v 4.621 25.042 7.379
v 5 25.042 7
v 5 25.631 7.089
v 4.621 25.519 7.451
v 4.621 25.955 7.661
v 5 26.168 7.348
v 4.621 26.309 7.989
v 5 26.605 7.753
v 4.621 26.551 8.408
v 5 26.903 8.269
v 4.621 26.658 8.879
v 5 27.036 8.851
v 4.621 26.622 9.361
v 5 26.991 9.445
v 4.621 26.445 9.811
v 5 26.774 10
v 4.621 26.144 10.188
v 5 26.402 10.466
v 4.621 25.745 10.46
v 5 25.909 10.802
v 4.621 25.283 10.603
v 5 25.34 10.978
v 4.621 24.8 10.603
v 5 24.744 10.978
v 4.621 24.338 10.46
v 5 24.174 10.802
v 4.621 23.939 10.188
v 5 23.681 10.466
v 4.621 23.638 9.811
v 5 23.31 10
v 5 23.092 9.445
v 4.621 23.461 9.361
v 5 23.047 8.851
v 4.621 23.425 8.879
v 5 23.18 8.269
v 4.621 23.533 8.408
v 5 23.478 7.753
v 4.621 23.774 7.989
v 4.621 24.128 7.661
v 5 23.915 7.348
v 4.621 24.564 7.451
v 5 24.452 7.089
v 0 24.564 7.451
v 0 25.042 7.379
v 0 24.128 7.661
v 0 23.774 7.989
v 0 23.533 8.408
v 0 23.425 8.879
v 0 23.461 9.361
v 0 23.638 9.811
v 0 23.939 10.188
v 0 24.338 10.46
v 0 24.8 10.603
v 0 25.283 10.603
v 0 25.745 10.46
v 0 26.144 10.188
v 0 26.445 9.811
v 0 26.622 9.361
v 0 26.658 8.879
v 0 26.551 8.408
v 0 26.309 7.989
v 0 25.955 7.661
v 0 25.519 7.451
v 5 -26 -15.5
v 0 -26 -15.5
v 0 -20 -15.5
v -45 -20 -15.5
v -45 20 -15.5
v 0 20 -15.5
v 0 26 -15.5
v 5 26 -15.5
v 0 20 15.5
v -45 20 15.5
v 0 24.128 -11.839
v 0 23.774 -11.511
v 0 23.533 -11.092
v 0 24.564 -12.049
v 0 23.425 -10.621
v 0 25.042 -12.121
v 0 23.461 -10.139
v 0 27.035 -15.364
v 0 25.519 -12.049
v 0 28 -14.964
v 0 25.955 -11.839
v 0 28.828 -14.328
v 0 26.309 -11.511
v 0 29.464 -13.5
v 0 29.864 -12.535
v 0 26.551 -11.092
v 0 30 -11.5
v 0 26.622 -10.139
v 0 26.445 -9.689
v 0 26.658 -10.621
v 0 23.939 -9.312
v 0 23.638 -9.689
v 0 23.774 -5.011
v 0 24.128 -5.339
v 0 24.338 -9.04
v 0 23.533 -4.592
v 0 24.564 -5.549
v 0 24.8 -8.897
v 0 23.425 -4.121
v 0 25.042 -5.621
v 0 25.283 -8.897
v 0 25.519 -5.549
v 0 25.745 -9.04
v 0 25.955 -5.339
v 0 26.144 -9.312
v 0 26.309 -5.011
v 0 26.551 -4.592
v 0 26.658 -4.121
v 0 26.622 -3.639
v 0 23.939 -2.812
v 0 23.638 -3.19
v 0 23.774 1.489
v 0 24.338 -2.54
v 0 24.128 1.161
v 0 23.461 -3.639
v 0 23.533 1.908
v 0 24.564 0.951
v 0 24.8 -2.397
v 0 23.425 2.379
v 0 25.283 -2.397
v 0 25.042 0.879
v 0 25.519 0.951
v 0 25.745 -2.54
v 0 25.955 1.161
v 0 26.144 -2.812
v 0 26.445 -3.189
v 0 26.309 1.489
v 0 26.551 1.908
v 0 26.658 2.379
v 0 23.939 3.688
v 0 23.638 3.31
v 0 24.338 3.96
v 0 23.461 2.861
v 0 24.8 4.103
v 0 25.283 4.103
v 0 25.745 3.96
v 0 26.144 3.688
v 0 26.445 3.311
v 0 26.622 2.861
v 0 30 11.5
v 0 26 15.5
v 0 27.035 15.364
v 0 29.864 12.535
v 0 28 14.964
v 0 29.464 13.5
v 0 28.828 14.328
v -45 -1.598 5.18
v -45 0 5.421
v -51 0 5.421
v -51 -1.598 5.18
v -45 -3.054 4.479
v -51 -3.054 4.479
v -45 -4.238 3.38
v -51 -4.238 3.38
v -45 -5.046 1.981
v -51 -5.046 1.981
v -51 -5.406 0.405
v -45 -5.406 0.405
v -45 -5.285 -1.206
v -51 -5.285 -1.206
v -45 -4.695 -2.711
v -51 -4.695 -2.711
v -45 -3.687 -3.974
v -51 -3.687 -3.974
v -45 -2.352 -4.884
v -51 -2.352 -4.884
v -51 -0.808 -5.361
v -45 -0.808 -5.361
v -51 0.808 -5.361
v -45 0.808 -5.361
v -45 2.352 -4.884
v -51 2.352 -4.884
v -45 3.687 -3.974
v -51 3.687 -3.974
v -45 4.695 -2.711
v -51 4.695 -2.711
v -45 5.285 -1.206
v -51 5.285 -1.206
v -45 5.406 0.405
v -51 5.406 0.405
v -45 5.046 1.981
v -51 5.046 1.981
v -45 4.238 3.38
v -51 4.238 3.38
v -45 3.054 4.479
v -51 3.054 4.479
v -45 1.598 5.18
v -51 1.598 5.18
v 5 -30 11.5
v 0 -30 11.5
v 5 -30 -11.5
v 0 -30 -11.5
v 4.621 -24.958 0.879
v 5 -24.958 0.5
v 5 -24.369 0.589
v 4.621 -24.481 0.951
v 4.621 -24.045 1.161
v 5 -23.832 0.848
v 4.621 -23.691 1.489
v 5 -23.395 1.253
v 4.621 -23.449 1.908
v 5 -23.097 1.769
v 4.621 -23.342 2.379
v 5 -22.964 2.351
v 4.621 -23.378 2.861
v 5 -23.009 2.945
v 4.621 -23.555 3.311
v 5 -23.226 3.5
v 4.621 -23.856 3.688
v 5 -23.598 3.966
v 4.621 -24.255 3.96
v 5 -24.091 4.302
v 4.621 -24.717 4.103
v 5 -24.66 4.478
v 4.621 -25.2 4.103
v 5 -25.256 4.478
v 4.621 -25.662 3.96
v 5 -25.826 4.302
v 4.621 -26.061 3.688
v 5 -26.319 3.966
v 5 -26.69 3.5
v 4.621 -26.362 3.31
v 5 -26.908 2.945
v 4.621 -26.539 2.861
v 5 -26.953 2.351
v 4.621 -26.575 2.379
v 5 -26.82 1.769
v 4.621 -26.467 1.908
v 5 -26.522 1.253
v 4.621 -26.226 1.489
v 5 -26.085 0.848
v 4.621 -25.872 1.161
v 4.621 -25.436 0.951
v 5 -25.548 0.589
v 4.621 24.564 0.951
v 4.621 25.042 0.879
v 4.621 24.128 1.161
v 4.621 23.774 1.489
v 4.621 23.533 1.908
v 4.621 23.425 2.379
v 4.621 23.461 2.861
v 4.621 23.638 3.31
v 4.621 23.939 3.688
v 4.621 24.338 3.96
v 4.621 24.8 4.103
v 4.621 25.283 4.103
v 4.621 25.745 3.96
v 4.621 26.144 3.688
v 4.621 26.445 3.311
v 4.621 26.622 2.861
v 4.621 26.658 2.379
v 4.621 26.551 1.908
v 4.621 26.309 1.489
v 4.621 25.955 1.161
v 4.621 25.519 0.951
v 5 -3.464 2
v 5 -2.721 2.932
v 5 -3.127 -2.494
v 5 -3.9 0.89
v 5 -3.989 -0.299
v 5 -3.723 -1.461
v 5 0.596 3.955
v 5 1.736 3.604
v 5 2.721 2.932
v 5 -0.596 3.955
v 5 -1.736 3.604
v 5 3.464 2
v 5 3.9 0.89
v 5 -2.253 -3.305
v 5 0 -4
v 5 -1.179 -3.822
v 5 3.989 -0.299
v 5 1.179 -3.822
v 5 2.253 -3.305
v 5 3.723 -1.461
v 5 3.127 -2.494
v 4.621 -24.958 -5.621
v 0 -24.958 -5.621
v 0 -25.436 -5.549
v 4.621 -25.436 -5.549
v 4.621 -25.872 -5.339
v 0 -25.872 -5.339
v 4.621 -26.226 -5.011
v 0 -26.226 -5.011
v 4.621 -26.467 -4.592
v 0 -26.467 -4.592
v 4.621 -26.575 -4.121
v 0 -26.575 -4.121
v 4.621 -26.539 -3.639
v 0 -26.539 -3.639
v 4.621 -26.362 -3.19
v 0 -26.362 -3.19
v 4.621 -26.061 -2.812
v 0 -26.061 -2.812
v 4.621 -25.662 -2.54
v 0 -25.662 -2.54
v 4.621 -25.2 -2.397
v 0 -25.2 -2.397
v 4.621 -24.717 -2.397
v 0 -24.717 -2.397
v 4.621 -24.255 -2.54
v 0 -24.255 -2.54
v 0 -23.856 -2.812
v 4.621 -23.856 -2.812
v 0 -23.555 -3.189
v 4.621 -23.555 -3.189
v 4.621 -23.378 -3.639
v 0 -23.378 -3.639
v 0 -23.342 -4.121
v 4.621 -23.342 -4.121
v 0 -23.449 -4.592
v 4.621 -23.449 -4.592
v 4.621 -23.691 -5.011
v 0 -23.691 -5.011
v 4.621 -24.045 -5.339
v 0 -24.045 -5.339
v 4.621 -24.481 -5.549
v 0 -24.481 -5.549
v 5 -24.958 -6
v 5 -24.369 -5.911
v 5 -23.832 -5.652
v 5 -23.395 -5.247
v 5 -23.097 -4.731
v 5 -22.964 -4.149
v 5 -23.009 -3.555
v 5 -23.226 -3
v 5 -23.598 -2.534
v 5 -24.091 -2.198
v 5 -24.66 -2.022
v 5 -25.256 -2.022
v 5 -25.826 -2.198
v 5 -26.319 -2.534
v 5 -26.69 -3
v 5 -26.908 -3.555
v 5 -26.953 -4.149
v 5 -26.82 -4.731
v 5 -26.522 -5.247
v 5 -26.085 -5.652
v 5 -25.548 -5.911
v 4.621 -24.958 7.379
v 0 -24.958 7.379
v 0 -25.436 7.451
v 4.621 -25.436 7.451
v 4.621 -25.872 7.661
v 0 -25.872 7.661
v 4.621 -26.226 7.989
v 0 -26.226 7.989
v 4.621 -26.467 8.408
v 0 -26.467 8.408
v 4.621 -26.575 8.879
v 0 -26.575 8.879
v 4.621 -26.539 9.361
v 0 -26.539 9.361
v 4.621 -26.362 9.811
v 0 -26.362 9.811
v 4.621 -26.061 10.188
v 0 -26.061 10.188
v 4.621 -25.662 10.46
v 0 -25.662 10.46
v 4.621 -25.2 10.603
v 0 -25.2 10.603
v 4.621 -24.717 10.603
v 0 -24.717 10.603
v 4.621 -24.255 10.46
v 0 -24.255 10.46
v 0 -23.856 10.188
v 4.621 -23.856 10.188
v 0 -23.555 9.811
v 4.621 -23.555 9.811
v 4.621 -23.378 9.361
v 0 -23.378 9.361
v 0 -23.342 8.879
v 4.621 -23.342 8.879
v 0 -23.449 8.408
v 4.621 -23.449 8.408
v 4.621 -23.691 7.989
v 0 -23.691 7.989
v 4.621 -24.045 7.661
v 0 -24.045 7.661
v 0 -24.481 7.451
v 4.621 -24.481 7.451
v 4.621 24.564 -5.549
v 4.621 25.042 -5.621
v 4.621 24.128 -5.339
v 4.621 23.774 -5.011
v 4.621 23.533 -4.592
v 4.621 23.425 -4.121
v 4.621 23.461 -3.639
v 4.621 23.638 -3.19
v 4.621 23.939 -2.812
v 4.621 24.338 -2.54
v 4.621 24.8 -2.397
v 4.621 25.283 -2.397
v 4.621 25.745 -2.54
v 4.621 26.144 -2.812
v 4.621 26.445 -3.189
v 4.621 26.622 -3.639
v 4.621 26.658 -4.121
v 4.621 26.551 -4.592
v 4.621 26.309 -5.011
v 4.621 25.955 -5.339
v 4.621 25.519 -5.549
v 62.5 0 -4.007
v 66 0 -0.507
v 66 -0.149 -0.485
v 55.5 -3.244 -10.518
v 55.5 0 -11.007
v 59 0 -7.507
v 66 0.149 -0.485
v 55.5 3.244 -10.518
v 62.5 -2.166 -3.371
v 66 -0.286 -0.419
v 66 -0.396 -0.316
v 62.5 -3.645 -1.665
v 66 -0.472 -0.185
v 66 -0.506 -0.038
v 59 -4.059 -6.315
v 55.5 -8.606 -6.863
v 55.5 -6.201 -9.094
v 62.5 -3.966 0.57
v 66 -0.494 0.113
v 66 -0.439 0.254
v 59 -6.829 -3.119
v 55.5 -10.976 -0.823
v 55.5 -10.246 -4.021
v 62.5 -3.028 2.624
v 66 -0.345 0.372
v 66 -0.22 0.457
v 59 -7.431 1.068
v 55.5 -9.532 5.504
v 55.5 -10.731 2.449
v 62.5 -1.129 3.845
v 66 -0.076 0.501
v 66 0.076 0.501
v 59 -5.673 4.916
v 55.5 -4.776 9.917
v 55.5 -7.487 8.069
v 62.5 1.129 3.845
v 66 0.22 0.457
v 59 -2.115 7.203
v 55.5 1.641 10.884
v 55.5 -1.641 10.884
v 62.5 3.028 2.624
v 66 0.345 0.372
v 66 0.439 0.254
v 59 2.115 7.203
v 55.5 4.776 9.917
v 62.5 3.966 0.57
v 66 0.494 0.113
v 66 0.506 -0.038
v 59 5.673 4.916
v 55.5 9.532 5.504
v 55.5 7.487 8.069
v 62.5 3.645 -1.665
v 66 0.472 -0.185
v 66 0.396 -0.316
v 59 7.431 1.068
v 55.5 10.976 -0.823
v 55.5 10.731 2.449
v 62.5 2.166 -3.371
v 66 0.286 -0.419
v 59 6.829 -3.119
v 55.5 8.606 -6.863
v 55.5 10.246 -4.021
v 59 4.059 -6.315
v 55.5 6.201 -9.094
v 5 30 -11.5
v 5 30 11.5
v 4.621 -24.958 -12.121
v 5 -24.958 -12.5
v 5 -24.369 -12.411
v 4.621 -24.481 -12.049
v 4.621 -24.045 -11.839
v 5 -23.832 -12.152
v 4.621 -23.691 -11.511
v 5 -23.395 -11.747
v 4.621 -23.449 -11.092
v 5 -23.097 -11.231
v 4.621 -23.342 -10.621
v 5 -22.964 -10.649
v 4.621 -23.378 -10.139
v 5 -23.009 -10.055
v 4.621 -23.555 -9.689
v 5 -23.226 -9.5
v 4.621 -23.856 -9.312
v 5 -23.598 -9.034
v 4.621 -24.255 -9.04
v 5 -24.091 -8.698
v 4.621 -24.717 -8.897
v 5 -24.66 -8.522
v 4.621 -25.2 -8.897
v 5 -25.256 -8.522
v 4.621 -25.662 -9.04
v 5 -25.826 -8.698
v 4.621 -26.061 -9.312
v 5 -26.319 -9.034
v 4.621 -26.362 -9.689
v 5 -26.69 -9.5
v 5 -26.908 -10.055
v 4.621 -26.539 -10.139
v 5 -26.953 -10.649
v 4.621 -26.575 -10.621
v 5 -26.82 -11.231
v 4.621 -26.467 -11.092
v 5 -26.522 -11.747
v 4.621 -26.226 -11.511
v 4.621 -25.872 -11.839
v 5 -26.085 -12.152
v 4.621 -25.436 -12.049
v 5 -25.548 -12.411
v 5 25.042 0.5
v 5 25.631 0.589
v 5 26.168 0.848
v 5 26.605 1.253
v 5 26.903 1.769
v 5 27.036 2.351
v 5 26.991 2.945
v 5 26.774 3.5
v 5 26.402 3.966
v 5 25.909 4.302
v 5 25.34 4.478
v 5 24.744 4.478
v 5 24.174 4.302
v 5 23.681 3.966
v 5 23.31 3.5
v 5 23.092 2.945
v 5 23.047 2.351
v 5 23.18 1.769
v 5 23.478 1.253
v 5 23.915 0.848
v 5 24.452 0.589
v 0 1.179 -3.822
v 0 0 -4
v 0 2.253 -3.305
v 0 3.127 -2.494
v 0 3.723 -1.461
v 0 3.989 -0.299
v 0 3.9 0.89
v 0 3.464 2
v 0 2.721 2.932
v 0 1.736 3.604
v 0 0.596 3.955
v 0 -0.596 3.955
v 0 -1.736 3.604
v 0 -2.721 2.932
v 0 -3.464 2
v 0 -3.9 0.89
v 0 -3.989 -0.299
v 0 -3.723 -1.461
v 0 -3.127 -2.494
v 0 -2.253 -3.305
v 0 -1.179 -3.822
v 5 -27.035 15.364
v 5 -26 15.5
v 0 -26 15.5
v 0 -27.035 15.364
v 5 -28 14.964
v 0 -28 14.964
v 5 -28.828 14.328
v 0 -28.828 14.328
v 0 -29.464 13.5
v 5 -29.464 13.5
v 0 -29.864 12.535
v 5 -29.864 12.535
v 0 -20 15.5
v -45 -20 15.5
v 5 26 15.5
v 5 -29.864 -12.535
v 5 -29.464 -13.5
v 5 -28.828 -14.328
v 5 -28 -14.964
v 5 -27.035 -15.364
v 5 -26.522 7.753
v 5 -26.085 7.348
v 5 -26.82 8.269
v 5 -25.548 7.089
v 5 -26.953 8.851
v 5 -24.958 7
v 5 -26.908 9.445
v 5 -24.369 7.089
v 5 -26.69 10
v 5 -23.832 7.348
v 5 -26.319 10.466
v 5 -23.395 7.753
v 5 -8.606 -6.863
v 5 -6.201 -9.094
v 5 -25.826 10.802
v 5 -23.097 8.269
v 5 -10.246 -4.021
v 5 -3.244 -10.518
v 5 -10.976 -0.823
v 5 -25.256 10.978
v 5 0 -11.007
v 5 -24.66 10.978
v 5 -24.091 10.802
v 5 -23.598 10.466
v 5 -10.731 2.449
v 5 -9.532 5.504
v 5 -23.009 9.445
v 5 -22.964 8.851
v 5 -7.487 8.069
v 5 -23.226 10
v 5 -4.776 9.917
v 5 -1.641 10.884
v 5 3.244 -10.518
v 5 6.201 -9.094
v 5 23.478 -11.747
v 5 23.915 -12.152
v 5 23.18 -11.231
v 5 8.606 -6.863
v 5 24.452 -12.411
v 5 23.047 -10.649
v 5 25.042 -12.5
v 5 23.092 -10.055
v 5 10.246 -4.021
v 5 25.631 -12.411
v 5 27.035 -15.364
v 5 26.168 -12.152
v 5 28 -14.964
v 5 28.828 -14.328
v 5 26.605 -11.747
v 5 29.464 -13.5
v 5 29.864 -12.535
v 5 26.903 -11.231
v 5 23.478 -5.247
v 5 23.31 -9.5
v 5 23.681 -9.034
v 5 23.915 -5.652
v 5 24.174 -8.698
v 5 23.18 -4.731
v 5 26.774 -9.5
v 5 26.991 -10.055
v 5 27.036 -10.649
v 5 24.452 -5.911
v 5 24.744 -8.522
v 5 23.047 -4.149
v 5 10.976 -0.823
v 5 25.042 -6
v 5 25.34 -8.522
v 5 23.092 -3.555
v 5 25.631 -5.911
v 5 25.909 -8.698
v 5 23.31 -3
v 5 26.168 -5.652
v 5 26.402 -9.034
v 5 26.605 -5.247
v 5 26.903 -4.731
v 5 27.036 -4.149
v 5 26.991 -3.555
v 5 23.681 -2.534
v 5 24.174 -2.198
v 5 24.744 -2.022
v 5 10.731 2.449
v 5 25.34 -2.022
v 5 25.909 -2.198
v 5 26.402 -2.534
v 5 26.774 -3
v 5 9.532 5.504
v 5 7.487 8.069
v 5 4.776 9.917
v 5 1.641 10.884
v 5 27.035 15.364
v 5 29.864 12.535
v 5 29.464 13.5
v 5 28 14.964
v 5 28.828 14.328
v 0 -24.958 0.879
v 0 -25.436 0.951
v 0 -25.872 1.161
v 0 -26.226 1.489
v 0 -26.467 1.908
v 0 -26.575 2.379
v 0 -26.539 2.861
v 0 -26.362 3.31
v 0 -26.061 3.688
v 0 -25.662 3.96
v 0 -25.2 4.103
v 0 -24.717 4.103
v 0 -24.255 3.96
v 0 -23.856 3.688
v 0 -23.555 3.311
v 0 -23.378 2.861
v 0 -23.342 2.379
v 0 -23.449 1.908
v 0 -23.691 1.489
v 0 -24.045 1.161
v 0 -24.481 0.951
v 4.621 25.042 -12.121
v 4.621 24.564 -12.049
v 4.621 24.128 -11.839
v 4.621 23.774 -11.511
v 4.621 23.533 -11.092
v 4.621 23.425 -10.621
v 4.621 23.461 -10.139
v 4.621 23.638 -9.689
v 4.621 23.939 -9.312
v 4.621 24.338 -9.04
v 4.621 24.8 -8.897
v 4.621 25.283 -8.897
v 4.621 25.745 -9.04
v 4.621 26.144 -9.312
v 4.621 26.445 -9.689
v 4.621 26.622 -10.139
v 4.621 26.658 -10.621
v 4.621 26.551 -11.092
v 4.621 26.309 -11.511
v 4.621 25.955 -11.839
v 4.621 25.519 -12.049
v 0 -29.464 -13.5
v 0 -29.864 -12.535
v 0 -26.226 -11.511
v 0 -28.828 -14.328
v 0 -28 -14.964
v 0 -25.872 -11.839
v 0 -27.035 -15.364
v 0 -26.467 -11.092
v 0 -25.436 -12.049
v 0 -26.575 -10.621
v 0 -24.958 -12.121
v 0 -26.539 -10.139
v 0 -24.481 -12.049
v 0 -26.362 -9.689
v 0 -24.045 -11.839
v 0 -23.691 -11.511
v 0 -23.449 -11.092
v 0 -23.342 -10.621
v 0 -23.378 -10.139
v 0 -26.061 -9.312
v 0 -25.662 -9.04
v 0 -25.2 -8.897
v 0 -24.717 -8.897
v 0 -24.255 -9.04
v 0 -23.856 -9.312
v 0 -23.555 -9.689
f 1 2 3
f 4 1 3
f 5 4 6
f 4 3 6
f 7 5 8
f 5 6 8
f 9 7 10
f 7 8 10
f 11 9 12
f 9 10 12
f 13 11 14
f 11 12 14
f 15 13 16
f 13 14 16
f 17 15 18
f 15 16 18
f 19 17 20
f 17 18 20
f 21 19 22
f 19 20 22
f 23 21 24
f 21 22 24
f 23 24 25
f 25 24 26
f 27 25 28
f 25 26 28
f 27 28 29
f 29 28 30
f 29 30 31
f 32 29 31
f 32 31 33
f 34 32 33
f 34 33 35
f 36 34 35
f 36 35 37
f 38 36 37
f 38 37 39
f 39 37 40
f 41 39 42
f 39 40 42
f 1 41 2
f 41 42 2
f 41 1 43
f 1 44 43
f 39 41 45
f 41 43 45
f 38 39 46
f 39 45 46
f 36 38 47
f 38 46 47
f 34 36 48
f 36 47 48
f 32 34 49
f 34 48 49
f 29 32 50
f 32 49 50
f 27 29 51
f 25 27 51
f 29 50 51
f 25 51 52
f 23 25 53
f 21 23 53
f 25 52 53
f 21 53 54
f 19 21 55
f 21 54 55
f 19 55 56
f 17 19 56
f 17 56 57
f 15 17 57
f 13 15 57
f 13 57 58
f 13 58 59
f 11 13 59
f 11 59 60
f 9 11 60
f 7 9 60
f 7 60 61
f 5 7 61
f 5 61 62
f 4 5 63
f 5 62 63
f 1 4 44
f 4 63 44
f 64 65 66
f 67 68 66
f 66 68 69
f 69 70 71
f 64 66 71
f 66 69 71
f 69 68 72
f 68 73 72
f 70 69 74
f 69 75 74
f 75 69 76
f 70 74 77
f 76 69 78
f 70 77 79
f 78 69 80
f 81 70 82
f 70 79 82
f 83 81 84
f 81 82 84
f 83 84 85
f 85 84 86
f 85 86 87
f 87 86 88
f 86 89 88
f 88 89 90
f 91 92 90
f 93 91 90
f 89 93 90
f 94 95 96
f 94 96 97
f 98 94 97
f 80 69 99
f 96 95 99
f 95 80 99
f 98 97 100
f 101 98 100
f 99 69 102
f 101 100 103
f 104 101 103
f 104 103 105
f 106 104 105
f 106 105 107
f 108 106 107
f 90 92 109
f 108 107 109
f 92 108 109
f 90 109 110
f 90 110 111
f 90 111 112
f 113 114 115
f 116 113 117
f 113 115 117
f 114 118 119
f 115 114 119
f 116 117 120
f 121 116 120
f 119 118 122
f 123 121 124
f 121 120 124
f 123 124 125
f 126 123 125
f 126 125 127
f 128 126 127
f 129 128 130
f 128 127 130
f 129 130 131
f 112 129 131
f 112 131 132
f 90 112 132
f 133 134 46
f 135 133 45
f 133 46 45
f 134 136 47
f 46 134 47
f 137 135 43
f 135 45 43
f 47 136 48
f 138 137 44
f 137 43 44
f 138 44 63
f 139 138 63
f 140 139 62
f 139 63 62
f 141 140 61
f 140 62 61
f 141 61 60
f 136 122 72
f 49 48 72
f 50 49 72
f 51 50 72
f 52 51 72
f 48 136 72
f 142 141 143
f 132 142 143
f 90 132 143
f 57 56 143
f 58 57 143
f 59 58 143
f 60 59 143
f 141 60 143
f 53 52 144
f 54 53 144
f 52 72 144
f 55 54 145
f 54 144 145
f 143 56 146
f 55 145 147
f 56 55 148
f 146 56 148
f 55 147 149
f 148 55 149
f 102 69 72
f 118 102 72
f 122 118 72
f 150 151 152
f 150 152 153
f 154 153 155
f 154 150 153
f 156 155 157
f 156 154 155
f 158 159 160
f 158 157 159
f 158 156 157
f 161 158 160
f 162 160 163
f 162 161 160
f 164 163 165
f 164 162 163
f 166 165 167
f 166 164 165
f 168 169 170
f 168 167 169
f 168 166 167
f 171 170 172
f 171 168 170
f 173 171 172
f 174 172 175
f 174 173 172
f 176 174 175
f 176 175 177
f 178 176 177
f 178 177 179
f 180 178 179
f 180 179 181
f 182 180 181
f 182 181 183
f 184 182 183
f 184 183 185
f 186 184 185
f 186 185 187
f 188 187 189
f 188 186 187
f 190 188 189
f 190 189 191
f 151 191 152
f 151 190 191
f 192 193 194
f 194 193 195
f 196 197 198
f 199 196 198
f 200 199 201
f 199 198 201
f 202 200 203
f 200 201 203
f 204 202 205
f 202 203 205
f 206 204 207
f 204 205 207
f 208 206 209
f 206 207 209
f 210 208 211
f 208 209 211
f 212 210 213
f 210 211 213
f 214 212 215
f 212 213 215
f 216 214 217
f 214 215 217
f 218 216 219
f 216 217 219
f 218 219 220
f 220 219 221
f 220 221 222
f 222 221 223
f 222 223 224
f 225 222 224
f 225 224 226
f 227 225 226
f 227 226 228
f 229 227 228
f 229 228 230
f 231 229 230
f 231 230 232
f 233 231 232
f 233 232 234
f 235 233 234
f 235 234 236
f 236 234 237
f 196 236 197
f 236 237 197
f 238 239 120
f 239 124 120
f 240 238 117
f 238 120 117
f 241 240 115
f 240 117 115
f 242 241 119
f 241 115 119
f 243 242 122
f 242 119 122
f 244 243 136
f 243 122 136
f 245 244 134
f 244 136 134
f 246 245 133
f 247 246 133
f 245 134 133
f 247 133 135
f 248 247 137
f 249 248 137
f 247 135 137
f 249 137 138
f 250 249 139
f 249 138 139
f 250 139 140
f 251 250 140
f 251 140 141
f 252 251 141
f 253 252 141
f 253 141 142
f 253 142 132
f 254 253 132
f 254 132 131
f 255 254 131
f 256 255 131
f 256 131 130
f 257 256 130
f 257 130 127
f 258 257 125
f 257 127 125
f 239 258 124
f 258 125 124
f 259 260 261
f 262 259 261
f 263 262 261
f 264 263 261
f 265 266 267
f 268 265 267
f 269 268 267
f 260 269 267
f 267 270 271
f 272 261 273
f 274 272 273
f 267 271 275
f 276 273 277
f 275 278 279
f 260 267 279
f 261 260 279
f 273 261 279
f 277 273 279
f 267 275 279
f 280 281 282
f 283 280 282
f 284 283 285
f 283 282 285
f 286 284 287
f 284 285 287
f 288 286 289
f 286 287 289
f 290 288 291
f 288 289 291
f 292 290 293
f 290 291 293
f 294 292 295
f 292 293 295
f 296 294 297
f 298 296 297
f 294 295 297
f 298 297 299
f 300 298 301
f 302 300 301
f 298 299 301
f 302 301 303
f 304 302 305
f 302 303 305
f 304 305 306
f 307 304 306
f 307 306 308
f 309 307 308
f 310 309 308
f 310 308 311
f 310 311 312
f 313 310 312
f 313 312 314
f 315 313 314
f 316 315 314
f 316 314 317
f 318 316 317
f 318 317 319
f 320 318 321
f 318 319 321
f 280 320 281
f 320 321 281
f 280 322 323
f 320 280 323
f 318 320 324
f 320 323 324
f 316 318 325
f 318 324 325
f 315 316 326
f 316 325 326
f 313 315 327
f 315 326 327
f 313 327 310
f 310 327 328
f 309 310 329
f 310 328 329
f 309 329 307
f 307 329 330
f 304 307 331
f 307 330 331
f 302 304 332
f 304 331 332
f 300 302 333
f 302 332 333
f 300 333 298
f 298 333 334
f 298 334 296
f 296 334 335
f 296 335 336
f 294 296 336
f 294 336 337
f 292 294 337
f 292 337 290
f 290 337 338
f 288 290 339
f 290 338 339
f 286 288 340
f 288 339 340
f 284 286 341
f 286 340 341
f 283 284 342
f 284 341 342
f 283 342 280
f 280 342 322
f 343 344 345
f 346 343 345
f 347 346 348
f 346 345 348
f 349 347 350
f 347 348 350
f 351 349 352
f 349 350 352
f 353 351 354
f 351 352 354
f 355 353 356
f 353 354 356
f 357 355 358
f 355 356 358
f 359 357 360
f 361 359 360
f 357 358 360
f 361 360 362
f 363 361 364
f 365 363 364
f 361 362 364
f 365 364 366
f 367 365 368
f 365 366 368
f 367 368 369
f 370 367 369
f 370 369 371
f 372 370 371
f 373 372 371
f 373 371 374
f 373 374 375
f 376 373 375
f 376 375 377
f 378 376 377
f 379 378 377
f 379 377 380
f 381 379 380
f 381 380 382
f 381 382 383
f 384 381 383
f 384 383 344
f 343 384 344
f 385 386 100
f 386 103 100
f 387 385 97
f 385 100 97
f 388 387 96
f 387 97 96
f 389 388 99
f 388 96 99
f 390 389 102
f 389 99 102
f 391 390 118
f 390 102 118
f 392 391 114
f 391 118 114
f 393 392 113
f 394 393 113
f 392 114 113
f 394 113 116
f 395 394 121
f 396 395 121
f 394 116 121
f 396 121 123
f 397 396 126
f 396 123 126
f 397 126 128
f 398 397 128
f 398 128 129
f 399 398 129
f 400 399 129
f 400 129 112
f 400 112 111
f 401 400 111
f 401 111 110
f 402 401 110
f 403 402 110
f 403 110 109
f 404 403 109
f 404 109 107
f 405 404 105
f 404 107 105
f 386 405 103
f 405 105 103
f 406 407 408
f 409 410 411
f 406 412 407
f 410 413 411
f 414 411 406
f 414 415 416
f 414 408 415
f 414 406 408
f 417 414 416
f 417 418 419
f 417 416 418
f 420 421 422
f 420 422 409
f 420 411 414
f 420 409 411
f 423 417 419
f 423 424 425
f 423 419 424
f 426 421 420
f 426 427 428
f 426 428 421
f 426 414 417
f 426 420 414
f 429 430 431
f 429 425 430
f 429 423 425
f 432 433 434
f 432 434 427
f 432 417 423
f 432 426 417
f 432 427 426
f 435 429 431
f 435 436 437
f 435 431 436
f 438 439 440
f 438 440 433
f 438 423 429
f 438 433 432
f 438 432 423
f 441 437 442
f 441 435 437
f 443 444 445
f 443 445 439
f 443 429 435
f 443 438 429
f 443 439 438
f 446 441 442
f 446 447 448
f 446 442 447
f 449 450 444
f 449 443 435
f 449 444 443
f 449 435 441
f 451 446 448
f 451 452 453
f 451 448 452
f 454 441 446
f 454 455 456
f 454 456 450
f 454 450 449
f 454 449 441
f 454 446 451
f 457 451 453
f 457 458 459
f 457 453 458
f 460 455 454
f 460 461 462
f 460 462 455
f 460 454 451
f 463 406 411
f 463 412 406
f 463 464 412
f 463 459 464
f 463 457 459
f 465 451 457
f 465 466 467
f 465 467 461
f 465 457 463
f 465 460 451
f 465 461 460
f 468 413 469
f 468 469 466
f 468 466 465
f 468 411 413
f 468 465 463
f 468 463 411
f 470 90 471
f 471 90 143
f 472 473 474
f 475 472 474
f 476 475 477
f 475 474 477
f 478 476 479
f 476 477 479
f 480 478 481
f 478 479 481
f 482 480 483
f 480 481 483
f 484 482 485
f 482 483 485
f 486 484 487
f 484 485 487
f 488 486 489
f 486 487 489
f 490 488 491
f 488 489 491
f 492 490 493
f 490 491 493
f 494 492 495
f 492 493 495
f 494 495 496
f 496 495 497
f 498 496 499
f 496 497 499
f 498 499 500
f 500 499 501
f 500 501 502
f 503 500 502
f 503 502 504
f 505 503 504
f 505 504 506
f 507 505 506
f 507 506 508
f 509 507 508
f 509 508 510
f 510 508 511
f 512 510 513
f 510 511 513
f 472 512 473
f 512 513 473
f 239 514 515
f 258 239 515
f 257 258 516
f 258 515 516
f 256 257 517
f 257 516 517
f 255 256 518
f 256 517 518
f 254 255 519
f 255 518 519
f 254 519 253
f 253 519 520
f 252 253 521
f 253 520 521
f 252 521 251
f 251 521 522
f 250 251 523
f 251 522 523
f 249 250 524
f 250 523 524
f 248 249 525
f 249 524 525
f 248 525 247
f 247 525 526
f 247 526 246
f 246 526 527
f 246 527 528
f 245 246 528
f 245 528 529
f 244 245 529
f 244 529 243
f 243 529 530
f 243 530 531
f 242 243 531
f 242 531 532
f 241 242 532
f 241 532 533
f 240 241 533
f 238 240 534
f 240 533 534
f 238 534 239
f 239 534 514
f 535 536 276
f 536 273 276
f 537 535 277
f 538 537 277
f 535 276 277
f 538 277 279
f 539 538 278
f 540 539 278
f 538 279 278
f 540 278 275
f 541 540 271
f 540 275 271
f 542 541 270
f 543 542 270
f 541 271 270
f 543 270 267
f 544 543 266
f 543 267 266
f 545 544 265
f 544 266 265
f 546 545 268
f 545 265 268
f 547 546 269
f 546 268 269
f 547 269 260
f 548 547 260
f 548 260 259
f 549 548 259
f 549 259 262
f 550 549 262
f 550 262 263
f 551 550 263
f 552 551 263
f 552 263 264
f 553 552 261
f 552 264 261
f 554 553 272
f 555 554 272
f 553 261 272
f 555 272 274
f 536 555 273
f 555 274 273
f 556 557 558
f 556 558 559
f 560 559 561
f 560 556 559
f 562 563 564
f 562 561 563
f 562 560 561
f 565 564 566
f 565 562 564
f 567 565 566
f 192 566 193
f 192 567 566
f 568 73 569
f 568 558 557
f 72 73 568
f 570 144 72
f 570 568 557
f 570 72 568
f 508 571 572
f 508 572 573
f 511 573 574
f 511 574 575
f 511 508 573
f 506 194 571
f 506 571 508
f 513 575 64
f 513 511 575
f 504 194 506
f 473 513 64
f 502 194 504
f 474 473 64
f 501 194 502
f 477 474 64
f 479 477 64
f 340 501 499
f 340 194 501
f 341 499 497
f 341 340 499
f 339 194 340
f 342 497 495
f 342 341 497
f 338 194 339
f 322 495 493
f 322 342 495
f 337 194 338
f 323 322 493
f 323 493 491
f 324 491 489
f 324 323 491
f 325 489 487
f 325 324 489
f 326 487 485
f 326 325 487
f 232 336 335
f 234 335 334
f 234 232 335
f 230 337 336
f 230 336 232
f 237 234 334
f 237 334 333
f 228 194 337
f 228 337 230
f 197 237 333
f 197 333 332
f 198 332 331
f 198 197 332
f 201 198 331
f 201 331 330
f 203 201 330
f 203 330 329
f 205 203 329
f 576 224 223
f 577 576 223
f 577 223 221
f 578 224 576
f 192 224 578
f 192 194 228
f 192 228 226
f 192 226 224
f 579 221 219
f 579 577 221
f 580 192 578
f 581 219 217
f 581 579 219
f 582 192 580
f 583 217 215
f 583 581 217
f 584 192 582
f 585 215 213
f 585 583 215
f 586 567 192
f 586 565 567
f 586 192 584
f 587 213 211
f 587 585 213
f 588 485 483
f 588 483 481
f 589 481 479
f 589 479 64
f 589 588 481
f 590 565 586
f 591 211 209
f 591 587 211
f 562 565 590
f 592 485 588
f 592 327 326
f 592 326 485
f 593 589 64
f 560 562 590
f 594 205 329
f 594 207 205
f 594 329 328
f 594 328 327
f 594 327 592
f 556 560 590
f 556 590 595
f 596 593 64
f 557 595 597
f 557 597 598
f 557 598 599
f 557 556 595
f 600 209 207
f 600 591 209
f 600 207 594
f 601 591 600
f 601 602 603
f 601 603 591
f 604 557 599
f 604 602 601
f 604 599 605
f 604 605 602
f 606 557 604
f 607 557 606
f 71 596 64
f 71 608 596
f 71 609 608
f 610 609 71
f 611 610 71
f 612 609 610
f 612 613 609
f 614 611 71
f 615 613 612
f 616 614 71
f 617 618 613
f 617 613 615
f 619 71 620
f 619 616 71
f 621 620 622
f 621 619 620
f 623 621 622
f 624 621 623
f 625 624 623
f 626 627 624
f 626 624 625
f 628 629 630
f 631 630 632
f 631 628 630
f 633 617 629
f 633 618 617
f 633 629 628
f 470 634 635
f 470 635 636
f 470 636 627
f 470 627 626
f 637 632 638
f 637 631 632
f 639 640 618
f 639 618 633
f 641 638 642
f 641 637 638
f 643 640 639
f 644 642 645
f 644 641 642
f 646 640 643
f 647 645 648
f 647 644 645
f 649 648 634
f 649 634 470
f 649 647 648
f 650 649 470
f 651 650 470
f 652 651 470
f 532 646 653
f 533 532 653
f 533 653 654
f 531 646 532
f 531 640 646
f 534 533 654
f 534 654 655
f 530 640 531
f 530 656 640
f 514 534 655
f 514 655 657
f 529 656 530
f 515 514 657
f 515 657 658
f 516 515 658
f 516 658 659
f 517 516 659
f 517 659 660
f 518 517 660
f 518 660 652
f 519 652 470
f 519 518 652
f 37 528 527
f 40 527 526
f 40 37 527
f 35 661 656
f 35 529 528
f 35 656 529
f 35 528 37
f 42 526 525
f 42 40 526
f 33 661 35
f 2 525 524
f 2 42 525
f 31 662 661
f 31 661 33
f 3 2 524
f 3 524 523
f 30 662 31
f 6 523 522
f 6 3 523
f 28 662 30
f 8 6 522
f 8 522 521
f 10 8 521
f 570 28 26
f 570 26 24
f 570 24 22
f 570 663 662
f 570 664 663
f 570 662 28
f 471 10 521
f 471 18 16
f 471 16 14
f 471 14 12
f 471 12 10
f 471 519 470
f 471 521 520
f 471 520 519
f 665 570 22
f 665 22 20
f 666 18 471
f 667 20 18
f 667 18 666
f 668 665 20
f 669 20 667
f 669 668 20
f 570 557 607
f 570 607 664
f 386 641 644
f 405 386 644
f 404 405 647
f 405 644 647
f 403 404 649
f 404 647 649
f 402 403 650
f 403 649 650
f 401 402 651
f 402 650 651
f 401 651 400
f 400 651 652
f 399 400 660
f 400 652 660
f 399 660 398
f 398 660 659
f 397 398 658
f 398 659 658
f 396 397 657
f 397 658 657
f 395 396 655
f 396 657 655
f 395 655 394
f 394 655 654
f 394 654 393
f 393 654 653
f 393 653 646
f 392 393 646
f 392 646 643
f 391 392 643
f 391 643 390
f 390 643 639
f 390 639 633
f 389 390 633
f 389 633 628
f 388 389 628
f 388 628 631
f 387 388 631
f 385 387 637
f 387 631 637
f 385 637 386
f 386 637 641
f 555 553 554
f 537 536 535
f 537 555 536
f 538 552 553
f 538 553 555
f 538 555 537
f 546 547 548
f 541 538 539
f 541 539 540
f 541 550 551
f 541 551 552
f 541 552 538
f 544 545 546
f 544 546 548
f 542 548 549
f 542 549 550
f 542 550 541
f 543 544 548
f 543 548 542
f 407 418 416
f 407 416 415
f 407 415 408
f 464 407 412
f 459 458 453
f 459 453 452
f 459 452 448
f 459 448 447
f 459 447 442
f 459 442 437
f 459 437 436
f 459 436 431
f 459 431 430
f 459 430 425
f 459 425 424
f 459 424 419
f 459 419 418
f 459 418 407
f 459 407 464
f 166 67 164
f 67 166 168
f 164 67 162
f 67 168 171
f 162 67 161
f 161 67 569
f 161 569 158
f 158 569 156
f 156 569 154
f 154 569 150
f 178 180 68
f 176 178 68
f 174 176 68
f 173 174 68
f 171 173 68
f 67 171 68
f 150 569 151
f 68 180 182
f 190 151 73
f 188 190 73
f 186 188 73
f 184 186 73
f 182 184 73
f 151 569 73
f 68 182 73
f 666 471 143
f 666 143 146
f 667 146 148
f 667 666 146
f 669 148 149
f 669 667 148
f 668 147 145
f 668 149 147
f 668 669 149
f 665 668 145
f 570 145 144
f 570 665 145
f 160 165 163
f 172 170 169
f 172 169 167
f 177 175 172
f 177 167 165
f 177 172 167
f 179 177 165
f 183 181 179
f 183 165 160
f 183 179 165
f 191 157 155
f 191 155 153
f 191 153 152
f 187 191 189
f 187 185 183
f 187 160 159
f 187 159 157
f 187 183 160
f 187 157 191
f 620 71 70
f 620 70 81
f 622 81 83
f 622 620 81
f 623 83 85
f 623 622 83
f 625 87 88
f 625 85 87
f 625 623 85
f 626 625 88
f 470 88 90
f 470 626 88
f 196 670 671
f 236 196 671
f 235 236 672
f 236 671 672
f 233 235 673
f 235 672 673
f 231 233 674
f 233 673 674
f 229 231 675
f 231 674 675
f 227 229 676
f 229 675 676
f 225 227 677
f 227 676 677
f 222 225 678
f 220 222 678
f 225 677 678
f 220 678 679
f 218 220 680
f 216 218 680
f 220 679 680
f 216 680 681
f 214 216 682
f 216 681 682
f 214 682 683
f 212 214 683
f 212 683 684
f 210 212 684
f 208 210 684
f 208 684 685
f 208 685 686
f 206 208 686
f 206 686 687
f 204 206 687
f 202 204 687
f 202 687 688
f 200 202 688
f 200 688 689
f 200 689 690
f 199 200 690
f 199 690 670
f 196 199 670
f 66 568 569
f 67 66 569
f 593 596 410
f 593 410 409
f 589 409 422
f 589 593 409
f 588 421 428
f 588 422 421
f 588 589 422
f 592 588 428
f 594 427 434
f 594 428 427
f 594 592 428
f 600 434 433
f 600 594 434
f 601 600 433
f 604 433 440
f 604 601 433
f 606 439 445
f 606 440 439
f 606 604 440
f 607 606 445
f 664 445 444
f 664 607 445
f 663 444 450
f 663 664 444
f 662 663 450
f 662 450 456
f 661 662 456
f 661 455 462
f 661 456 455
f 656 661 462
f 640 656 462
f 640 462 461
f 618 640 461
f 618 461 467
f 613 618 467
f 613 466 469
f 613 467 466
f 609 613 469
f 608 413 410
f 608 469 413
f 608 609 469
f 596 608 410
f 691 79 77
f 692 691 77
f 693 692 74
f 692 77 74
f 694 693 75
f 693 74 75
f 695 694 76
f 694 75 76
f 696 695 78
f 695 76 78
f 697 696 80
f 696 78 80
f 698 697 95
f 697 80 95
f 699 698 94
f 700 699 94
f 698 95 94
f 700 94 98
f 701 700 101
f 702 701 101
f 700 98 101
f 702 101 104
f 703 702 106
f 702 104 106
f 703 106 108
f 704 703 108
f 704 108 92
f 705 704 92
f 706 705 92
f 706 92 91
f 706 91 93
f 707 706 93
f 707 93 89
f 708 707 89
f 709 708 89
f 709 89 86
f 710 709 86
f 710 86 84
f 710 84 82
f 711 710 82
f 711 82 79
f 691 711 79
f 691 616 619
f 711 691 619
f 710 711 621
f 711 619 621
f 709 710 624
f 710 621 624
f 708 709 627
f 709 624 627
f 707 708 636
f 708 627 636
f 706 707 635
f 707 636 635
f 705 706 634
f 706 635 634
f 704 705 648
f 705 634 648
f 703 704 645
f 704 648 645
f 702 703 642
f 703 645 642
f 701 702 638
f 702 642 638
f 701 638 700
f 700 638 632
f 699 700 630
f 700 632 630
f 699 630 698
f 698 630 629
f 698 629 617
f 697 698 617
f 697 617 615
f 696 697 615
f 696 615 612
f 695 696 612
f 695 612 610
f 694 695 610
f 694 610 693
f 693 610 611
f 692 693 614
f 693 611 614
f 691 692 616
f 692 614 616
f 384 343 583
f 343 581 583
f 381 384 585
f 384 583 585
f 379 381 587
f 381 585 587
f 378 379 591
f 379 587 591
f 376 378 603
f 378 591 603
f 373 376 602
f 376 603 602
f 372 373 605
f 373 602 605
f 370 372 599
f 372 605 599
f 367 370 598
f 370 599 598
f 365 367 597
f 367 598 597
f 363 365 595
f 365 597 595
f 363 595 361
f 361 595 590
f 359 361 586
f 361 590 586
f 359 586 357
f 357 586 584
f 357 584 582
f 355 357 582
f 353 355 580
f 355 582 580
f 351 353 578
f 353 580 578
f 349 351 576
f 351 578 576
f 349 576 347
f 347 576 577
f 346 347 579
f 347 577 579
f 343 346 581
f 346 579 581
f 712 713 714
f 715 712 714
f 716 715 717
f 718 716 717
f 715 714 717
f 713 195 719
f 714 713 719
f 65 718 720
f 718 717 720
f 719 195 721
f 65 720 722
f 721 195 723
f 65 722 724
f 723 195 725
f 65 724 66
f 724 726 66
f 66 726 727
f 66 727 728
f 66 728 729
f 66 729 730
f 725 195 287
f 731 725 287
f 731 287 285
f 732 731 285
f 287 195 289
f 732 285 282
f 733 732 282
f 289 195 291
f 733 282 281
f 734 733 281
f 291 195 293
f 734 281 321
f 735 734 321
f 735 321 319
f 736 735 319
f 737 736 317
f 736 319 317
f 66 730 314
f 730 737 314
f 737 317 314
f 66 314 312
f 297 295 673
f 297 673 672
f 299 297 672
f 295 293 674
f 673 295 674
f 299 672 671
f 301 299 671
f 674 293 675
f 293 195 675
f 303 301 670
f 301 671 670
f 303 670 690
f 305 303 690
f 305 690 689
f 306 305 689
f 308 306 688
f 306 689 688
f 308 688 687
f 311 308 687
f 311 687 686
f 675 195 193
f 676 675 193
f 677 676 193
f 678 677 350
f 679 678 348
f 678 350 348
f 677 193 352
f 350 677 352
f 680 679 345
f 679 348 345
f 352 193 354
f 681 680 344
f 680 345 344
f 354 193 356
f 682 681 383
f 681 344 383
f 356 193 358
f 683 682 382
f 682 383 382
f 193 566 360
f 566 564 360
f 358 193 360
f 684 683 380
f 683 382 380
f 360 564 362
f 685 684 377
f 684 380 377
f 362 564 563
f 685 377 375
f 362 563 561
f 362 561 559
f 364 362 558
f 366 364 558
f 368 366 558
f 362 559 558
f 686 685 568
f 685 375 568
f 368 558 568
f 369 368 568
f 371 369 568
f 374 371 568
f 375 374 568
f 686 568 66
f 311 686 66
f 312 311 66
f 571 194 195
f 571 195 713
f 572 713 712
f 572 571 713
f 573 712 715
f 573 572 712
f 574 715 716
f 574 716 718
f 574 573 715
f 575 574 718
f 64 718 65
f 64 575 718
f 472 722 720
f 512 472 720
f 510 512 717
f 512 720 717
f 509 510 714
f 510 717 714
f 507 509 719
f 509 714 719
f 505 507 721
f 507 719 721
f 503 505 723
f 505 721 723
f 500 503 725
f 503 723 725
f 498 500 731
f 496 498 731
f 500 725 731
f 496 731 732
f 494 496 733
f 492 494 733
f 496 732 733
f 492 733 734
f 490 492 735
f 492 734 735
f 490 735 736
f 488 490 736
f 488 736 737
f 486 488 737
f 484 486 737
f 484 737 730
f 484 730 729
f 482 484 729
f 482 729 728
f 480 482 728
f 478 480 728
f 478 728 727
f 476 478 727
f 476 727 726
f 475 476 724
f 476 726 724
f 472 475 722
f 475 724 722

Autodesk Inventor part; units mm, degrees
ref_plane "YZ Plane" through (0, 0, 0) normal (1, 0, 0) x (0, 1, 0)
ref_plane "XZ Plane" through (0, 0, 0) normal (0, 1, 0) x (-1, 0, 0)
ref_plane "XY Plane" through (0, 0, 0) normal (0, 0, 1) x (1, 0, 0)
sketch "Sketch1" plane through (0, 0, 0) normal (1, 0, 0) x (0, 1, 0)
  line L0 (-30, -15.5) -> (30, -15.5)
  line L1 (30, -15.5) -> (30, 15.5)
  line L2 (30, 15.5) -> (-30, 15.5)
  line L3 (-30, 15.5) -> (-30, -15.5)
  line L4 (-30, -15.5) -> (30, 15.5) construction
  line L5 (30, -15.5) -> (-30, 15.5) construction
  point P0 (0, 0)
  dimension "d0" = 60
  dimension "d1" = 31
extrude "Extrusion1" add sketch "Sketch1" along normal blind 5
fillet "Fillet1" radius 4 4 edges at (2.5, 30, 15.5) (2.5, 30, -15.5) (2.5, -30, -15.5) (2.5, -30, 15.5)
sketch "Sketch2" plane through (5, 0, 0) normal (1, 0, 0) x (0, 0, -1)
  line L0 (-15.5, 26) -> (-15.5, -26) projected
  line L1 (11.5, 30) -> (-11.5, 30) projected
  point P0 (0, 0)
  point P1 (-9, 25.0416)
  point P2 (-9, -24.9584)
  point P3 (-2.5, 25.0416)
  point P4 (-2.5, -24.9584)
  point P5 (4, 25.0416)
  point P6 (4, -24.9584)
  point P7 (10.5, 25.0416)
  point P8 (10.5, -24.9584)
  dimension "d5" = 6.5
  dimension "d8" = 50
  dimension "d11" = 6.5
hole "Hole1" at (5, 25.0416, 9) at (5, -24.9584, 9) at (5, 25.0416, 2.5) at (5, -24.9584, 2.5) at (5, 25.0416, -4) at (5, -24.9584, -4) at (5, 25.0416, -10.5) at (5, -24.9584, -10.5) direction (-1, 0, 0) diameter 3.242 depth 11.8 tip angle 118 countersink diameter 4 countersink angle 90 thread size "M4x0.7" class "6H" standard "ISO Metric profile"
sketch "Sketch3" plane through (5, 0, 0) normal (1, 0, 0) x (0, 0, -1)
  circle A0 centre (0, 0) radius 4
  dimension "d21" = 8
extrude "Extrusion2" cut sketch "Sketch3" against normal blind 5
sketch "Sketch4" plane through (0, -26, 15.5) normal (0, 0, 1) x (1, 0, 0)
  line L0 (0, 0) -> (0, 52) projected
  line L1 (0, 6) -> (-45, 6)
  line L2 (-45, 6) -> (-45, 46)
  line L3 (-45, 46) -> (0, 46)
  line L4 (0, 46) -> (0, 6)
  line L5 (5, 52) -> (5, 0) projected
  line L6 (0, 26) -> (-7.0205, 26) construction
  dimension "d24" = 50
  dimension "d25" = 40
extrude "Extrusion3" add sketch "Sketch4" against normal up to surface (31 mm away)
sketch "Sketch5" plane through (-45, -20, 15.5) normal (-1, 0, 0) x (0, 0, 1)
  circle A0 centre (-15.5, 20) radius 5.4211
extrude "Extrusion4" add sketch "Sketch5" along normal blind 6
sketch "Sketch6" plane through (5, 0, 0) normal (1, 0, 0) x (0, 0, -1)
  circle A0 centre (0, 0) radius 11.0071
extrude "Extrusion5" add sketch "Sketch6" along normal blind 61
chamfer "Chamfer1" distance 10.5 angle 45 1 edges at (66, 0, 11.0071)
properties part number "GT9S Extruder"
